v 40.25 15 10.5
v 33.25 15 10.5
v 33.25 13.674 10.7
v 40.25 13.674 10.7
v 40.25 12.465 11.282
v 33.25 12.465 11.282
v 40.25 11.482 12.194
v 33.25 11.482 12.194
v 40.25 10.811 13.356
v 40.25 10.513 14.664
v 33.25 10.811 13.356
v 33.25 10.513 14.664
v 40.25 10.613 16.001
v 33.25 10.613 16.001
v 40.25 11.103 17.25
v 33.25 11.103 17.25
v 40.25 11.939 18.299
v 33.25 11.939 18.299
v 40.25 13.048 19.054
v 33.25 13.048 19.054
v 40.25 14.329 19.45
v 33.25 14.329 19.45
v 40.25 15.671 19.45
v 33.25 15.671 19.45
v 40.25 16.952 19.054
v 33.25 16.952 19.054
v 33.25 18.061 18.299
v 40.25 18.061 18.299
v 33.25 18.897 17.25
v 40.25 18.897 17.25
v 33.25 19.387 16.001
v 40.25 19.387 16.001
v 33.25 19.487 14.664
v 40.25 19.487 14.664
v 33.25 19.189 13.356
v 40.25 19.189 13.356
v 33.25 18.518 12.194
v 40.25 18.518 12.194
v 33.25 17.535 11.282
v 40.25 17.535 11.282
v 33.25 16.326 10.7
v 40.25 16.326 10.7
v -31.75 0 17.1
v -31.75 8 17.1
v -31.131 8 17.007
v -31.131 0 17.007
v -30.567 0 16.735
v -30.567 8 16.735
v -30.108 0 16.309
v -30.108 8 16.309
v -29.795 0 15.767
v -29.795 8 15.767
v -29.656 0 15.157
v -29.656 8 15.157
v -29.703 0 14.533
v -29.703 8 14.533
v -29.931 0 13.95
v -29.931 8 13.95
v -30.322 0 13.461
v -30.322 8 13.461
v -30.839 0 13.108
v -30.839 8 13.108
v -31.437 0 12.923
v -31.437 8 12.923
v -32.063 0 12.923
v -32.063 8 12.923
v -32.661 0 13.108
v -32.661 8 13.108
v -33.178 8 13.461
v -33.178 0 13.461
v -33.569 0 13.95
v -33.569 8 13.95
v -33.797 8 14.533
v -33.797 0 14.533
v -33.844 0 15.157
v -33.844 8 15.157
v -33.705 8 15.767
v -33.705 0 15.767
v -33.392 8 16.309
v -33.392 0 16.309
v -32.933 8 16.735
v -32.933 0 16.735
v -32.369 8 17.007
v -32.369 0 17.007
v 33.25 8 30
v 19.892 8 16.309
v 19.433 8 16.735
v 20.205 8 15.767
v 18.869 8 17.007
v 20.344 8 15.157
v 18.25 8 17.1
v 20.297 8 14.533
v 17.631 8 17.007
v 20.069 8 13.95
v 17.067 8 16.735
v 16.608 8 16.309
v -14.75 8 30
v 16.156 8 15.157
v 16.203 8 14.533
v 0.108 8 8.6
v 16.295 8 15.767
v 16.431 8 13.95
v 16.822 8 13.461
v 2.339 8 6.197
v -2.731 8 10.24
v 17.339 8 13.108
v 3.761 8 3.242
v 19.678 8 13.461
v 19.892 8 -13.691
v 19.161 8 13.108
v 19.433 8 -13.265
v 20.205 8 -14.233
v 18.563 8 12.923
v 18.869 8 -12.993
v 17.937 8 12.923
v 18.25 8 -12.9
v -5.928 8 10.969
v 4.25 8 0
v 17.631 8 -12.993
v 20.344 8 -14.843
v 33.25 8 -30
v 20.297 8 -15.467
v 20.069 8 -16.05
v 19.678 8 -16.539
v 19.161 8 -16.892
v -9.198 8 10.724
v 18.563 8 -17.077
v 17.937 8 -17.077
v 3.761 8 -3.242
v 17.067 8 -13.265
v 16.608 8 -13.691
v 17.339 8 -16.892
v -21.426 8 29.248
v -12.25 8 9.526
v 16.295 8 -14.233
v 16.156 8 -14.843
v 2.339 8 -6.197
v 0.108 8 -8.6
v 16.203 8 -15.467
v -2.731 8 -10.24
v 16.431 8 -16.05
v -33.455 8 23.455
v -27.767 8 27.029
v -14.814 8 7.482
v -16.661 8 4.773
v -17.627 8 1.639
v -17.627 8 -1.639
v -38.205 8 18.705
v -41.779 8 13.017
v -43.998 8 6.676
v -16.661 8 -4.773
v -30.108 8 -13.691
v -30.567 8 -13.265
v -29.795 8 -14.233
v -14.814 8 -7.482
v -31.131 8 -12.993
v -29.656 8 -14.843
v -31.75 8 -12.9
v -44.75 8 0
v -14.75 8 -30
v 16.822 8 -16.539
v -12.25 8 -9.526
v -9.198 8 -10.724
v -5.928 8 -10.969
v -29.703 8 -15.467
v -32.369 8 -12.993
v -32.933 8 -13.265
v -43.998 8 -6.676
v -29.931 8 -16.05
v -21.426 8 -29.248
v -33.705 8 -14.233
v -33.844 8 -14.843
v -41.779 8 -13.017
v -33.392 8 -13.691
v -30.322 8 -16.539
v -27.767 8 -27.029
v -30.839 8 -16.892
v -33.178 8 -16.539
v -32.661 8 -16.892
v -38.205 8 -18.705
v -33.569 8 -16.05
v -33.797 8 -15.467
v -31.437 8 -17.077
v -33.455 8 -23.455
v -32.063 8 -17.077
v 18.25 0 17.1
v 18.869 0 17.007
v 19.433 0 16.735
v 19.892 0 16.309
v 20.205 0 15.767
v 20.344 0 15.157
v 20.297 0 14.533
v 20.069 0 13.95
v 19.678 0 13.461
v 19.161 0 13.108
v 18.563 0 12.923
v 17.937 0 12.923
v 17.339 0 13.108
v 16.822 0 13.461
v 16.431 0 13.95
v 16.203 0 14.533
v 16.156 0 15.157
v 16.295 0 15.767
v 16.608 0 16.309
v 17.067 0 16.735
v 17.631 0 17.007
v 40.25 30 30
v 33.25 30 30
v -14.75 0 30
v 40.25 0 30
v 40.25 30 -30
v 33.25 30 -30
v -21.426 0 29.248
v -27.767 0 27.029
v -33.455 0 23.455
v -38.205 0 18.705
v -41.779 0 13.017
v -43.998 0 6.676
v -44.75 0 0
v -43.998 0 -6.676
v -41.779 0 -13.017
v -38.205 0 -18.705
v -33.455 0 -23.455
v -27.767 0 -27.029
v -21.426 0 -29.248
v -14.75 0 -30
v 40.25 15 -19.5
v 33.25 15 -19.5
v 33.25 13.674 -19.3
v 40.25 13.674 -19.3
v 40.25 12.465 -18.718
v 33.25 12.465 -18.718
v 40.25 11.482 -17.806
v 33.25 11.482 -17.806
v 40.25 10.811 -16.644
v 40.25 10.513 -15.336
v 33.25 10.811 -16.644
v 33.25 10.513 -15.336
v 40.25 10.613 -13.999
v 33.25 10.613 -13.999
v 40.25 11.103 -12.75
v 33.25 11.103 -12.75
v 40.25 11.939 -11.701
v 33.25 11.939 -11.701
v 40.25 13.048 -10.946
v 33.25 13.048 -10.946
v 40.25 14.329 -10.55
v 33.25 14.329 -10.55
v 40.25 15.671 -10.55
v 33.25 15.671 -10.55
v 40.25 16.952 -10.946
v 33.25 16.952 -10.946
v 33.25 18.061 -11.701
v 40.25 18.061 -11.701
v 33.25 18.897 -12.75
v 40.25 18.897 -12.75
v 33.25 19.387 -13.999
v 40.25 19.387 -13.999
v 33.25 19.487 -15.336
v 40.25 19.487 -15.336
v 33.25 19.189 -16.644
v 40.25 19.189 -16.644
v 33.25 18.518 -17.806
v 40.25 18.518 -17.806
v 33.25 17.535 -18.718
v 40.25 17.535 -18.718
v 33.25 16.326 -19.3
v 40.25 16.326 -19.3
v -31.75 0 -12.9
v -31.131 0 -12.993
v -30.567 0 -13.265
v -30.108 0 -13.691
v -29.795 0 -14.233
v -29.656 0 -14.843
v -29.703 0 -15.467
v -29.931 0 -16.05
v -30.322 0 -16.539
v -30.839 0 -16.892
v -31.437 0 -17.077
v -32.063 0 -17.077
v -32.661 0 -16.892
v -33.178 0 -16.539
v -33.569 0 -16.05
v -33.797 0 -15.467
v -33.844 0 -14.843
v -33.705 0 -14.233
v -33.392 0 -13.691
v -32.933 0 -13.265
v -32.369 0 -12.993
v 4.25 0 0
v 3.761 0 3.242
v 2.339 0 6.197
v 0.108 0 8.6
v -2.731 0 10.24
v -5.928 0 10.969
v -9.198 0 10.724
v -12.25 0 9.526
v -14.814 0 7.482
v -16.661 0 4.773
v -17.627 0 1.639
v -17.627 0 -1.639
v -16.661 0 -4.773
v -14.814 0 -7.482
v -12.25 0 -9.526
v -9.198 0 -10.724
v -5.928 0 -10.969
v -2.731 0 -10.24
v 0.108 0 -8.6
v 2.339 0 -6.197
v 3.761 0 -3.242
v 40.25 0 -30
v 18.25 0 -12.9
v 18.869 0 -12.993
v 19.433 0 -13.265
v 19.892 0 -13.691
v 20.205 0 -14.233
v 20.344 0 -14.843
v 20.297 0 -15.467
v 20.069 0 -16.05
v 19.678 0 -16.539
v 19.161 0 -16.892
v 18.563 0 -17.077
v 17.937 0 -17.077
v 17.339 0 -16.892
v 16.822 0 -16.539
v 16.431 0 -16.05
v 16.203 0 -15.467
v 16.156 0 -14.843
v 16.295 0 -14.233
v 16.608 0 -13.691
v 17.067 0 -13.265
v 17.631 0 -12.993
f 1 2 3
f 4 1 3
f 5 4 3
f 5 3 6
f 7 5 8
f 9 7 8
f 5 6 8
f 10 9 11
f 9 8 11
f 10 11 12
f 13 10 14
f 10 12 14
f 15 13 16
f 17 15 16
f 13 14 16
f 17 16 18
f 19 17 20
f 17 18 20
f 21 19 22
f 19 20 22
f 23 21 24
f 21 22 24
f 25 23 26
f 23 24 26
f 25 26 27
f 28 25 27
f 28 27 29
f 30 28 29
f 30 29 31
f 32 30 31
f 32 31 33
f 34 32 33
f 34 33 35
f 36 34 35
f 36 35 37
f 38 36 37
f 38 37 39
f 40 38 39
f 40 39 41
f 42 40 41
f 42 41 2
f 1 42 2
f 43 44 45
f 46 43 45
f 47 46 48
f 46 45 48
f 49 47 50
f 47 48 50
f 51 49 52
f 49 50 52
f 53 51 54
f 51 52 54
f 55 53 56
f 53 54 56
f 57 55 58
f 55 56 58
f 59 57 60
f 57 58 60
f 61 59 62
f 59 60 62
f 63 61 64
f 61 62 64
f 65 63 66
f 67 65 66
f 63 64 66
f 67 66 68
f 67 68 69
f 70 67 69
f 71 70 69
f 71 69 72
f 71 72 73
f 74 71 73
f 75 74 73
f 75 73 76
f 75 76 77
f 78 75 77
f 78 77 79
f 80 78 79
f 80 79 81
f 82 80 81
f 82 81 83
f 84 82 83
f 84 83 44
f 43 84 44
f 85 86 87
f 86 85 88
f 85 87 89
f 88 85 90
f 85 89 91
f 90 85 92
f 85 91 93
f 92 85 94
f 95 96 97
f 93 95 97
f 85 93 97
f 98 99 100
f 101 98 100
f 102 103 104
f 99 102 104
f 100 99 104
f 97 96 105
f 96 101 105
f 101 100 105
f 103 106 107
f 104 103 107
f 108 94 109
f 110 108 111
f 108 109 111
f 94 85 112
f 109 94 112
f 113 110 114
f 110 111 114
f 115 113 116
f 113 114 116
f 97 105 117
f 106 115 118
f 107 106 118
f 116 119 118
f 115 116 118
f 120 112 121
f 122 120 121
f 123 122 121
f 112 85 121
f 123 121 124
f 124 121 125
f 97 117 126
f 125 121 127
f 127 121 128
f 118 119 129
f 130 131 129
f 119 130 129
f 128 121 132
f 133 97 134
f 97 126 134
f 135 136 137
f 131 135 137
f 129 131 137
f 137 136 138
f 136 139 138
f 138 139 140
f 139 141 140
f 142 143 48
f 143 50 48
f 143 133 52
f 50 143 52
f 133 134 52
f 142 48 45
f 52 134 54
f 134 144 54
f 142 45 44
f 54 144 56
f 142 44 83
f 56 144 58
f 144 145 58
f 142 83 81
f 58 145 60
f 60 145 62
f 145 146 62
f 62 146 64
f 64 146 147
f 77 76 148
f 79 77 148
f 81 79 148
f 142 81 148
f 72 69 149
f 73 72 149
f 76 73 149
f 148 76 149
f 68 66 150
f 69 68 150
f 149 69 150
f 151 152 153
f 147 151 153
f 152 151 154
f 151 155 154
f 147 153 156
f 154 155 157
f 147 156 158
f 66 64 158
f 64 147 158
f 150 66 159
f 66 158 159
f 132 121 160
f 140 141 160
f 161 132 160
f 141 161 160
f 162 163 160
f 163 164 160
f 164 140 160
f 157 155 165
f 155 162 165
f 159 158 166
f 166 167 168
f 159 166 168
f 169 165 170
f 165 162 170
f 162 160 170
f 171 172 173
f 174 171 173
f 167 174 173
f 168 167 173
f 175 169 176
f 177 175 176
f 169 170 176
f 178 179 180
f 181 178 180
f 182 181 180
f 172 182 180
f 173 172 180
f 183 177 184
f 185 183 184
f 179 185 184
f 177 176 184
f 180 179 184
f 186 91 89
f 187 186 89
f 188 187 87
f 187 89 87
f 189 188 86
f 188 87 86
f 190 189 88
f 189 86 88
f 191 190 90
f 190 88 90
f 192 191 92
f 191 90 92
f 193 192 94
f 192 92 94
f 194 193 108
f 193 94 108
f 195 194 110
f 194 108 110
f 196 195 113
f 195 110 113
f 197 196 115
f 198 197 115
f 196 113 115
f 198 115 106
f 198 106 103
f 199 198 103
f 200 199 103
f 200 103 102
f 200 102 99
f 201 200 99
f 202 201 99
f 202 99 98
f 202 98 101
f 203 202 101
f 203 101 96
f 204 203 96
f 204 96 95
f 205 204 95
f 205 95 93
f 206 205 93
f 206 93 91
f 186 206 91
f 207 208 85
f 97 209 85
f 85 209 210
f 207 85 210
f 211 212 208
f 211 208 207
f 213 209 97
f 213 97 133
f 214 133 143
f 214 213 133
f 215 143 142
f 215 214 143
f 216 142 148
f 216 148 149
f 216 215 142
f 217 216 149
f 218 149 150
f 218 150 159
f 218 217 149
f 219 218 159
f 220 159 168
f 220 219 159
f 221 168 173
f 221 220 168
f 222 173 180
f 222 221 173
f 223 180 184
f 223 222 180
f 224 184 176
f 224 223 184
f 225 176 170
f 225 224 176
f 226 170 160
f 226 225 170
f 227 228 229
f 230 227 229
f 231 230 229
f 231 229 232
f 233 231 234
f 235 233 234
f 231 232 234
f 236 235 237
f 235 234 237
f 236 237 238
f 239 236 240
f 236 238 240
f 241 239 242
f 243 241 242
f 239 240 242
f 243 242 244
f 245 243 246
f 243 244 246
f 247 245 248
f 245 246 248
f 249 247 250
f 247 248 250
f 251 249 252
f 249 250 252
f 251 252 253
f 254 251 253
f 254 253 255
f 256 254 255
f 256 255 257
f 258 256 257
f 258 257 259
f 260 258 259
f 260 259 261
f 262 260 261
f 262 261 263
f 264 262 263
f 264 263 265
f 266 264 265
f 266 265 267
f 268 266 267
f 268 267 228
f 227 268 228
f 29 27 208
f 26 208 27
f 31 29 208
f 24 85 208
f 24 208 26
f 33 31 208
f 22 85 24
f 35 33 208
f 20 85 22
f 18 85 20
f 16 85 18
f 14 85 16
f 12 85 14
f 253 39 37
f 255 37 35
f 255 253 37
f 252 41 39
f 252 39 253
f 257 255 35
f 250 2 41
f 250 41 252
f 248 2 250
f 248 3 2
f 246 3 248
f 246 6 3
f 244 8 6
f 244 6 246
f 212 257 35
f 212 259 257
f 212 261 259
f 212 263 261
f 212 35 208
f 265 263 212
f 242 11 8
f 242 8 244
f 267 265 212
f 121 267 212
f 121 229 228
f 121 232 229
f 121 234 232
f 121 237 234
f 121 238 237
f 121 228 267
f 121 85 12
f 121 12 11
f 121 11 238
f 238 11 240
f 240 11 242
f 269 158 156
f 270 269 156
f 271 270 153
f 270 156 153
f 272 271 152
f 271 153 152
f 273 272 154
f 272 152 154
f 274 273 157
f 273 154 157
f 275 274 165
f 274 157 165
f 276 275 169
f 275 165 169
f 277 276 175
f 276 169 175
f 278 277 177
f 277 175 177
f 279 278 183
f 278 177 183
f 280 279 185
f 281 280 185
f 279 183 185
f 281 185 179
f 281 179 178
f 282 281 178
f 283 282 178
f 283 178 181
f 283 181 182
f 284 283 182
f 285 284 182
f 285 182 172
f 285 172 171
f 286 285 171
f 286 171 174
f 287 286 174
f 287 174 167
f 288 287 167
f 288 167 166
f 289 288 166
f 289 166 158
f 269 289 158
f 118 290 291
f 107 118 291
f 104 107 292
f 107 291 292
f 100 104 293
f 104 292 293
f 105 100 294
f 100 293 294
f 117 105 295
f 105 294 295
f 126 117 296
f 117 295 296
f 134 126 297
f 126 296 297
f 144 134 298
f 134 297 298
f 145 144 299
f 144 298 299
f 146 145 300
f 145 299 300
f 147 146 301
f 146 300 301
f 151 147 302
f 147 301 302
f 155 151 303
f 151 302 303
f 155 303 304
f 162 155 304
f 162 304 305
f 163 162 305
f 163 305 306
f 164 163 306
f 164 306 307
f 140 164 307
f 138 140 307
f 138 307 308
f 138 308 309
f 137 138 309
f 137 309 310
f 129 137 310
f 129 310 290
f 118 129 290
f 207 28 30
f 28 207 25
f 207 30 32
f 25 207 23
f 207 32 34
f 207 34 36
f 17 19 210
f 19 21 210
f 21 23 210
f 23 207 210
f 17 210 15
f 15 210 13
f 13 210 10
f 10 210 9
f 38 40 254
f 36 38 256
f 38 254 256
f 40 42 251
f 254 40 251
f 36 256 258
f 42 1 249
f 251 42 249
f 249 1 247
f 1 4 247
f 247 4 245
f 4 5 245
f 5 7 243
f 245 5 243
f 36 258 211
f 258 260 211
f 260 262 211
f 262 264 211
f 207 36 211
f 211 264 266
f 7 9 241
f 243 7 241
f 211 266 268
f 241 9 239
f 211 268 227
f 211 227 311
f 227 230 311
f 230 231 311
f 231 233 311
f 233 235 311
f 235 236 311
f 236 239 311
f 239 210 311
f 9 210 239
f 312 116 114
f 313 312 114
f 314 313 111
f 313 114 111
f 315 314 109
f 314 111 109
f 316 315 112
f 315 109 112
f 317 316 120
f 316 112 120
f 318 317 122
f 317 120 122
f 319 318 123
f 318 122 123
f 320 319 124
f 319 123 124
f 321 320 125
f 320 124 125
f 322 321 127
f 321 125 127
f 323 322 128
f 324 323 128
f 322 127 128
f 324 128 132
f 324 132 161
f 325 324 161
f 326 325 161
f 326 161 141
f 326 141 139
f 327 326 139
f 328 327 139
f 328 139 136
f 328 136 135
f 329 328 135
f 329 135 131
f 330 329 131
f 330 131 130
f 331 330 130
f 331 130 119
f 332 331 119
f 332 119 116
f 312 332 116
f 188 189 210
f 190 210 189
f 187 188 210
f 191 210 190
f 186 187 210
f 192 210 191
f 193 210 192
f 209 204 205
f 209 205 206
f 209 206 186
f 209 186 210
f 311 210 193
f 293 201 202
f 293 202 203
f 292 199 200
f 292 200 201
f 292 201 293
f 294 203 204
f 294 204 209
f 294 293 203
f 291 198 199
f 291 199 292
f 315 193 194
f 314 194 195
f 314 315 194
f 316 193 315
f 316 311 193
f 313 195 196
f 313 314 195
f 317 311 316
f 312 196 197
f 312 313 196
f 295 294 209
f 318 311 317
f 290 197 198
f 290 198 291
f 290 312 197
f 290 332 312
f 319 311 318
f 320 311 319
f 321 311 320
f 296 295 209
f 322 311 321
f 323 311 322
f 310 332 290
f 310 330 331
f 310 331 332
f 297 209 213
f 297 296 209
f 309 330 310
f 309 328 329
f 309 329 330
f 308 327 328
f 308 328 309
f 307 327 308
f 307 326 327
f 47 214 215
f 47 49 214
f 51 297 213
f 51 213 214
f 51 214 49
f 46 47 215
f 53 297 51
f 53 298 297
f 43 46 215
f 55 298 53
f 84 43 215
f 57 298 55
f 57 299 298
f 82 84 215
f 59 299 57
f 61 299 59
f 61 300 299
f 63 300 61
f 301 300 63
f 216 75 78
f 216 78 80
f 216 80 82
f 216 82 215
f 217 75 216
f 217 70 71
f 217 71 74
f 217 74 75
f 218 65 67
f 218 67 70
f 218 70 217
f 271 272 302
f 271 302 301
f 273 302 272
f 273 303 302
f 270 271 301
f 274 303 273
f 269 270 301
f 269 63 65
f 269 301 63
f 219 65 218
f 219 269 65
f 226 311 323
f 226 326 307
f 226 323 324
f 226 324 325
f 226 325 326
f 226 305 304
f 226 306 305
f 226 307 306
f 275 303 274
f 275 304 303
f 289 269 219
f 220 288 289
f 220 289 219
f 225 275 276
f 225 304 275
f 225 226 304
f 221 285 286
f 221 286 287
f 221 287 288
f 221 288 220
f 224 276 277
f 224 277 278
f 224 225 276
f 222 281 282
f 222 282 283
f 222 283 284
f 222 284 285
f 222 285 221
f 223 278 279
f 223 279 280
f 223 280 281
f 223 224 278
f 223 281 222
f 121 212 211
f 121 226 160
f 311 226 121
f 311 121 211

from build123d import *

# Parameters (mm, degrees)
EXTRUDE_1_DEPTH     = 8
SKETCH_2_W          = 7
SKETCH_2_H          = 60
EXTRUDE_2_DEPTH     = 22
MM_1_D              = 9
HOLE_WIZARD_M5_1_D  = 4.2
SKETCH_5_R          = 11
CUT_EXTRUDE_1_DEPTH = 10


with BuildPart() as part:
    # 草图1 → 凸台-拉伸1 (new body)
    with BuildSketch(Plane(origin=(0, 0, 0), x_dir=(1, 0, 0), z_dir=(0, 1, 0))):
        with BuildLine():
            Line((-14.75, 30), (40.25, 30))
            Line((40.25, 30), (40.25, -30))
            Line((40.25, -30), (-14.75, -30))
            ThreePointArc((-14.75, -30), (-44.75, 0), (-14.75, 30))
        make_face()
    extrude(amount=EXTRUDE_1_DEPTH)

    # 草图2 → 凸台-拉伸2 (add)
    with BuildSketch(Plane(origin=(0, 8, 0), x_dir=(1, 0, 0), z_dir=(0, 1, 0))):
        with Locations((36.75, 0)):
            Rectangle(SKETCH_2_W, SKETCH_2_H)
    extrude(amount=EXTRUDE_2_DEPTH)

    # 大小mm 暗销孔1 (through all)
    with Locations(Plane(origin=(40.25, 15, 15), x_dir=(0, 0, 1), z_dir=(1, 0, 0))):
        with Locations((0, 0), (-30, 0)):
            Hole(MM_1_D / 2)

    # M5 螺纹孔1 (through all)
    with Locations(Plane(origin=(-31.75, 0, 15), x_dir=(0, 0, -1), z_dir=(0, -1, 0))):
        with Locations((0, 0), (0, 50), (30, 50), (30, 0)):
            Hole(HOLE_WIZARD_M5_1_D / 2)

    # 草图5 → 切除-拉伸1 (cut)
    with BuildSketch(Plane.XZ):
        with Locations((-6.75, 0)):
            Circle(SKETCH_5_R)
    extrude(amount=-CUT_EXTRUDE_1_DEPTH, mode=Mode.SUBTRACT)


solid = part.part
